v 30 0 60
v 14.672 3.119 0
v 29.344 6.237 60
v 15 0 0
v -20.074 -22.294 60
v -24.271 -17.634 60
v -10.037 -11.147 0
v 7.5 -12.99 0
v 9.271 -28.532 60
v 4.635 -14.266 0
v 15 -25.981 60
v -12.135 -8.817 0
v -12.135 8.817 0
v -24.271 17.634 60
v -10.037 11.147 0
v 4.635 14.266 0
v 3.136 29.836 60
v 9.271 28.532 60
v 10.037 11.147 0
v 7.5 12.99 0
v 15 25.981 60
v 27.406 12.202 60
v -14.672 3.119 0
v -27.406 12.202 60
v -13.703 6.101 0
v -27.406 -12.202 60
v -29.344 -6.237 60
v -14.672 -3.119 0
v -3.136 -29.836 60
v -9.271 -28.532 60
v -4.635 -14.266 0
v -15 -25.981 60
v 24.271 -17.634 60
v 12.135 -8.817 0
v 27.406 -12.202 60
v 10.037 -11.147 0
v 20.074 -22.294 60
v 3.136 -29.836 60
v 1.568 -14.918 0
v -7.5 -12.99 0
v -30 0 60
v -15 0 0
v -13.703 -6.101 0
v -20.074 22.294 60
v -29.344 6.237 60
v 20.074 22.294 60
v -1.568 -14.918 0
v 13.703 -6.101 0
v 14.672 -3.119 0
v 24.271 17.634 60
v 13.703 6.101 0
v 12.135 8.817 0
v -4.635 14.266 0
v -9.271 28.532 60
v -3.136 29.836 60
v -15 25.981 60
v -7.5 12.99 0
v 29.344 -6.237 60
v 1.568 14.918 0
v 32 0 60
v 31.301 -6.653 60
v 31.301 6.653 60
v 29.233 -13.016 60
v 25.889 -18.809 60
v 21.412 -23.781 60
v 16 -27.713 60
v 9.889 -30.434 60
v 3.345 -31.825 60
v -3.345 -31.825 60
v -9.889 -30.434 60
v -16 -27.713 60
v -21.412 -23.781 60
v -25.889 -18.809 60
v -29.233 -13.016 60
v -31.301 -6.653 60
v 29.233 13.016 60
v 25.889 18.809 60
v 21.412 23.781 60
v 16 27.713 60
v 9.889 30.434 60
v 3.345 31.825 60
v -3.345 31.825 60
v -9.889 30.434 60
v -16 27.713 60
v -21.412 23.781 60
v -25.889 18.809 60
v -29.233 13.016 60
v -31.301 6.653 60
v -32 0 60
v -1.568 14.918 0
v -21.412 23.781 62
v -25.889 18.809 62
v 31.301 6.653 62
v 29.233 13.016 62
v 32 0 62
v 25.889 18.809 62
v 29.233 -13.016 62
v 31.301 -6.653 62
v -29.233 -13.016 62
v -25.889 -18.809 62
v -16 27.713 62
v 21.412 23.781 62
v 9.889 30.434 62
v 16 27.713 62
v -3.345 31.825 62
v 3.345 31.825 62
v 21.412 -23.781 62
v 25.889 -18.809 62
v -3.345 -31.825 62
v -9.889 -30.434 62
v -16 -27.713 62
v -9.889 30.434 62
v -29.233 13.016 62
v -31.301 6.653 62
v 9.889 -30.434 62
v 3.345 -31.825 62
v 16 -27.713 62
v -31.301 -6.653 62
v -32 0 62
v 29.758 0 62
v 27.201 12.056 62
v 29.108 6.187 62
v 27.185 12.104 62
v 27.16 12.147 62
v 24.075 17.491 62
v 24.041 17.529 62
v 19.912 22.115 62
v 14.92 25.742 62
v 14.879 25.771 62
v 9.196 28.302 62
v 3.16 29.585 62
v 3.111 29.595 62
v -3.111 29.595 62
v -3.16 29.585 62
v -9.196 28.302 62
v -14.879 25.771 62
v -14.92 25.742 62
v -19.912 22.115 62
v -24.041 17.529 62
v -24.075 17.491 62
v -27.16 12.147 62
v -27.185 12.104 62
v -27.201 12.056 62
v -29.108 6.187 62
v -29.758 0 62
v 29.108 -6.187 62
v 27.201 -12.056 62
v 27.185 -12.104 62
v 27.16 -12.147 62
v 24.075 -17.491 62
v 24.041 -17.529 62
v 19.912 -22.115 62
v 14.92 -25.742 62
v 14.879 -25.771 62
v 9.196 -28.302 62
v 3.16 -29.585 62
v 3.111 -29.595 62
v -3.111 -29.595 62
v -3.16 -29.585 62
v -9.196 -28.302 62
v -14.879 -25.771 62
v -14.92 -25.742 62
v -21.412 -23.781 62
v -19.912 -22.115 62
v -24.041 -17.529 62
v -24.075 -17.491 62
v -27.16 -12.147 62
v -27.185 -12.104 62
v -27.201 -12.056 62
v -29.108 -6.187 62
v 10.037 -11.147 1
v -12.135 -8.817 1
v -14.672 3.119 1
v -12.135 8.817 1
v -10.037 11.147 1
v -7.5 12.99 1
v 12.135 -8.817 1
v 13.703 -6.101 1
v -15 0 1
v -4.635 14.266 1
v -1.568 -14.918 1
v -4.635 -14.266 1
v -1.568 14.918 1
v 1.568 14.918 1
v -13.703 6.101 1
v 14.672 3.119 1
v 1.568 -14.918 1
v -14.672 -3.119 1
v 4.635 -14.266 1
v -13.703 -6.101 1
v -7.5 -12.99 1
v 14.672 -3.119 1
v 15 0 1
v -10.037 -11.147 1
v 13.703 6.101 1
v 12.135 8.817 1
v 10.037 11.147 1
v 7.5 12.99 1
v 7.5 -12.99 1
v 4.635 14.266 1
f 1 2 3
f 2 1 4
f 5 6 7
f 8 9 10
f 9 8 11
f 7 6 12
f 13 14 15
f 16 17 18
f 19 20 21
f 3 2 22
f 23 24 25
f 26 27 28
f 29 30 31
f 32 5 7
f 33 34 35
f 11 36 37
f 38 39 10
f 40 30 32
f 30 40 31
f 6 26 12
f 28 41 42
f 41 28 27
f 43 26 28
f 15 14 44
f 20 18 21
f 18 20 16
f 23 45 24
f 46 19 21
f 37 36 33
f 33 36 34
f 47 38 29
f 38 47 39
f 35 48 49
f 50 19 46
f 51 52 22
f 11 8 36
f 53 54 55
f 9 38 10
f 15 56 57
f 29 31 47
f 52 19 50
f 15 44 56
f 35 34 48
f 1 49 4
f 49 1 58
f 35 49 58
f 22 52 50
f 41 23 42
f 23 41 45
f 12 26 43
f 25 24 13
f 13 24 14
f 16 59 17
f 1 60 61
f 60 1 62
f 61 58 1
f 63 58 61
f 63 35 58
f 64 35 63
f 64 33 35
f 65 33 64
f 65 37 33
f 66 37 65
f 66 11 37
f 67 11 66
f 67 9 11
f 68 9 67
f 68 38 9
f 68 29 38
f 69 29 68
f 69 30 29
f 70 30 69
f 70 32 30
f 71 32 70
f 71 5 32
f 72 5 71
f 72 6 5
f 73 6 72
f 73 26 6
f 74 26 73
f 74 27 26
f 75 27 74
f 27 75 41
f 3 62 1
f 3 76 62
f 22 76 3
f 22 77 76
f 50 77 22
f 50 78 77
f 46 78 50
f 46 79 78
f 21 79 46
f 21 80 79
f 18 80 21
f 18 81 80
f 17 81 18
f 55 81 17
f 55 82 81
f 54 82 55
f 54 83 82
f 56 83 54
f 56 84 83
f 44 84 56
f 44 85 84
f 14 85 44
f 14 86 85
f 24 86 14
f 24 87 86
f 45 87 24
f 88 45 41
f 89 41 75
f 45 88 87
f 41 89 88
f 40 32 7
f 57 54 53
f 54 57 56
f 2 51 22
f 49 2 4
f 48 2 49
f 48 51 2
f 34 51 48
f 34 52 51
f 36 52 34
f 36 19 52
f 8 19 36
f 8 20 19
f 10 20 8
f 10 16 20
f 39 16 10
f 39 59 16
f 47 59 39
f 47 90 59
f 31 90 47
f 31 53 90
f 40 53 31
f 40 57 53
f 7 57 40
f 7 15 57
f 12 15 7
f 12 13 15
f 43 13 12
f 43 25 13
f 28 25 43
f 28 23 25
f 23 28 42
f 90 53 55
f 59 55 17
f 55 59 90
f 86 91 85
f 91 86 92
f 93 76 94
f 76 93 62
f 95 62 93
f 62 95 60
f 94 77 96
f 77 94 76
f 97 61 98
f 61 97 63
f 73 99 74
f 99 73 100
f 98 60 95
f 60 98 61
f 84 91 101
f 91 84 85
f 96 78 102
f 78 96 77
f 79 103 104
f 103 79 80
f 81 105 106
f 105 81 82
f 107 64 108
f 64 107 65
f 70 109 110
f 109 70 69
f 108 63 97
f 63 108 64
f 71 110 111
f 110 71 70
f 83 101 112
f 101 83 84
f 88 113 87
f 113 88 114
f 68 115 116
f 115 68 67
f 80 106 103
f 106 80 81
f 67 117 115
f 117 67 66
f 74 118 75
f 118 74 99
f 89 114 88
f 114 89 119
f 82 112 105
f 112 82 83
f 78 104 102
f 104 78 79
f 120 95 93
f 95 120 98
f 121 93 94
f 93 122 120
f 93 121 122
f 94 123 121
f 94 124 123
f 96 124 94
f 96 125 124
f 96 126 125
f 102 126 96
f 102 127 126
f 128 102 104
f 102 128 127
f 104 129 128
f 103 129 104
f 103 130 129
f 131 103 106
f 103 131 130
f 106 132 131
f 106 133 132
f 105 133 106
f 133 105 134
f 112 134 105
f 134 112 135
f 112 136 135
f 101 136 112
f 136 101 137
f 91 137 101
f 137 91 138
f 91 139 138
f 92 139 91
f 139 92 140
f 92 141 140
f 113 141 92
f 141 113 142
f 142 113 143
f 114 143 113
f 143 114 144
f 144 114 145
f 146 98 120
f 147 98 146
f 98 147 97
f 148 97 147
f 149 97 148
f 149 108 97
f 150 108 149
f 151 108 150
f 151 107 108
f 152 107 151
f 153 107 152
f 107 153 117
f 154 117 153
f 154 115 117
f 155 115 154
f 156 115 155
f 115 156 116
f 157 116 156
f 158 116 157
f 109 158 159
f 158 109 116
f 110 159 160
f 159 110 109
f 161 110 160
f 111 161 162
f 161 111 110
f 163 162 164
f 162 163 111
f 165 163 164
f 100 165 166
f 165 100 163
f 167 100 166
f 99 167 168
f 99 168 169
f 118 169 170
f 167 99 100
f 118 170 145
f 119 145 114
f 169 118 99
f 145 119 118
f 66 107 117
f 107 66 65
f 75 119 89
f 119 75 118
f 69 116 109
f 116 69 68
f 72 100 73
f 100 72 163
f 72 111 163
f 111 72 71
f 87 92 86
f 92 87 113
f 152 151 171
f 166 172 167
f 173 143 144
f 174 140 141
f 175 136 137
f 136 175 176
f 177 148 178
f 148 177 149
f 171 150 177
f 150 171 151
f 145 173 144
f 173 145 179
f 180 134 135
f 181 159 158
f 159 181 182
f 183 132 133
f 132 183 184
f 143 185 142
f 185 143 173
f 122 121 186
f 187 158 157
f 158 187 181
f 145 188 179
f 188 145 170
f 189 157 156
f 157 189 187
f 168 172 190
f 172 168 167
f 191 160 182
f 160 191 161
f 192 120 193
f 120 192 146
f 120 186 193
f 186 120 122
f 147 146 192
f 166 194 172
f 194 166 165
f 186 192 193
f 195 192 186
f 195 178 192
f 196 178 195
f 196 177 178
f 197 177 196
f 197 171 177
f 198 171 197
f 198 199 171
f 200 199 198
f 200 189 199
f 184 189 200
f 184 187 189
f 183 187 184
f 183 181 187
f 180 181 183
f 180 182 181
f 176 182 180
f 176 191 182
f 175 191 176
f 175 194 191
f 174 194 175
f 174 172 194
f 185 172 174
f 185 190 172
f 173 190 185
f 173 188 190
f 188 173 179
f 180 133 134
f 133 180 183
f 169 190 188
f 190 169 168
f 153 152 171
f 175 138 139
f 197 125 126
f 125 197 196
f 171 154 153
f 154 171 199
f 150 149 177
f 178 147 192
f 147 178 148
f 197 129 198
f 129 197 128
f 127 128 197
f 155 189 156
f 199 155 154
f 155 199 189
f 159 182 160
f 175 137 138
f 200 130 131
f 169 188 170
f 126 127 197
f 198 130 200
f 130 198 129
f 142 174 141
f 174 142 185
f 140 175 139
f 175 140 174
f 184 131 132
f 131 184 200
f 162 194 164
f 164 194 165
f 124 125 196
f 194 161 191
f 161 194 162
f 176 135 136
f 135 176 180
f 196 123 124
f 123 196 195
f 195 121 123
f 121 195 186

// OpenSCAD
module pahar_plastic(inaltime_pahar,raza_baza_pahar,raza_sus_pahar,raza_buza,inaltime_buza,grosime_perete)
{
    difference(){
        union(){
      cylinder (h=inaltime_pahar, r1=15, r2=30);
        translate([0,0,60]) cylinder(h=inaltime_buza,r=raza_buza);
        }
 translate([0,0,grosime_perete]) cylinder (h=inaltime_pahar+ inaltime_buza,r1=raza_baza_pahar, r2=raza_sus_pahar);
    }        
}

pahar_plastic(60,15,30,32,2,1);
